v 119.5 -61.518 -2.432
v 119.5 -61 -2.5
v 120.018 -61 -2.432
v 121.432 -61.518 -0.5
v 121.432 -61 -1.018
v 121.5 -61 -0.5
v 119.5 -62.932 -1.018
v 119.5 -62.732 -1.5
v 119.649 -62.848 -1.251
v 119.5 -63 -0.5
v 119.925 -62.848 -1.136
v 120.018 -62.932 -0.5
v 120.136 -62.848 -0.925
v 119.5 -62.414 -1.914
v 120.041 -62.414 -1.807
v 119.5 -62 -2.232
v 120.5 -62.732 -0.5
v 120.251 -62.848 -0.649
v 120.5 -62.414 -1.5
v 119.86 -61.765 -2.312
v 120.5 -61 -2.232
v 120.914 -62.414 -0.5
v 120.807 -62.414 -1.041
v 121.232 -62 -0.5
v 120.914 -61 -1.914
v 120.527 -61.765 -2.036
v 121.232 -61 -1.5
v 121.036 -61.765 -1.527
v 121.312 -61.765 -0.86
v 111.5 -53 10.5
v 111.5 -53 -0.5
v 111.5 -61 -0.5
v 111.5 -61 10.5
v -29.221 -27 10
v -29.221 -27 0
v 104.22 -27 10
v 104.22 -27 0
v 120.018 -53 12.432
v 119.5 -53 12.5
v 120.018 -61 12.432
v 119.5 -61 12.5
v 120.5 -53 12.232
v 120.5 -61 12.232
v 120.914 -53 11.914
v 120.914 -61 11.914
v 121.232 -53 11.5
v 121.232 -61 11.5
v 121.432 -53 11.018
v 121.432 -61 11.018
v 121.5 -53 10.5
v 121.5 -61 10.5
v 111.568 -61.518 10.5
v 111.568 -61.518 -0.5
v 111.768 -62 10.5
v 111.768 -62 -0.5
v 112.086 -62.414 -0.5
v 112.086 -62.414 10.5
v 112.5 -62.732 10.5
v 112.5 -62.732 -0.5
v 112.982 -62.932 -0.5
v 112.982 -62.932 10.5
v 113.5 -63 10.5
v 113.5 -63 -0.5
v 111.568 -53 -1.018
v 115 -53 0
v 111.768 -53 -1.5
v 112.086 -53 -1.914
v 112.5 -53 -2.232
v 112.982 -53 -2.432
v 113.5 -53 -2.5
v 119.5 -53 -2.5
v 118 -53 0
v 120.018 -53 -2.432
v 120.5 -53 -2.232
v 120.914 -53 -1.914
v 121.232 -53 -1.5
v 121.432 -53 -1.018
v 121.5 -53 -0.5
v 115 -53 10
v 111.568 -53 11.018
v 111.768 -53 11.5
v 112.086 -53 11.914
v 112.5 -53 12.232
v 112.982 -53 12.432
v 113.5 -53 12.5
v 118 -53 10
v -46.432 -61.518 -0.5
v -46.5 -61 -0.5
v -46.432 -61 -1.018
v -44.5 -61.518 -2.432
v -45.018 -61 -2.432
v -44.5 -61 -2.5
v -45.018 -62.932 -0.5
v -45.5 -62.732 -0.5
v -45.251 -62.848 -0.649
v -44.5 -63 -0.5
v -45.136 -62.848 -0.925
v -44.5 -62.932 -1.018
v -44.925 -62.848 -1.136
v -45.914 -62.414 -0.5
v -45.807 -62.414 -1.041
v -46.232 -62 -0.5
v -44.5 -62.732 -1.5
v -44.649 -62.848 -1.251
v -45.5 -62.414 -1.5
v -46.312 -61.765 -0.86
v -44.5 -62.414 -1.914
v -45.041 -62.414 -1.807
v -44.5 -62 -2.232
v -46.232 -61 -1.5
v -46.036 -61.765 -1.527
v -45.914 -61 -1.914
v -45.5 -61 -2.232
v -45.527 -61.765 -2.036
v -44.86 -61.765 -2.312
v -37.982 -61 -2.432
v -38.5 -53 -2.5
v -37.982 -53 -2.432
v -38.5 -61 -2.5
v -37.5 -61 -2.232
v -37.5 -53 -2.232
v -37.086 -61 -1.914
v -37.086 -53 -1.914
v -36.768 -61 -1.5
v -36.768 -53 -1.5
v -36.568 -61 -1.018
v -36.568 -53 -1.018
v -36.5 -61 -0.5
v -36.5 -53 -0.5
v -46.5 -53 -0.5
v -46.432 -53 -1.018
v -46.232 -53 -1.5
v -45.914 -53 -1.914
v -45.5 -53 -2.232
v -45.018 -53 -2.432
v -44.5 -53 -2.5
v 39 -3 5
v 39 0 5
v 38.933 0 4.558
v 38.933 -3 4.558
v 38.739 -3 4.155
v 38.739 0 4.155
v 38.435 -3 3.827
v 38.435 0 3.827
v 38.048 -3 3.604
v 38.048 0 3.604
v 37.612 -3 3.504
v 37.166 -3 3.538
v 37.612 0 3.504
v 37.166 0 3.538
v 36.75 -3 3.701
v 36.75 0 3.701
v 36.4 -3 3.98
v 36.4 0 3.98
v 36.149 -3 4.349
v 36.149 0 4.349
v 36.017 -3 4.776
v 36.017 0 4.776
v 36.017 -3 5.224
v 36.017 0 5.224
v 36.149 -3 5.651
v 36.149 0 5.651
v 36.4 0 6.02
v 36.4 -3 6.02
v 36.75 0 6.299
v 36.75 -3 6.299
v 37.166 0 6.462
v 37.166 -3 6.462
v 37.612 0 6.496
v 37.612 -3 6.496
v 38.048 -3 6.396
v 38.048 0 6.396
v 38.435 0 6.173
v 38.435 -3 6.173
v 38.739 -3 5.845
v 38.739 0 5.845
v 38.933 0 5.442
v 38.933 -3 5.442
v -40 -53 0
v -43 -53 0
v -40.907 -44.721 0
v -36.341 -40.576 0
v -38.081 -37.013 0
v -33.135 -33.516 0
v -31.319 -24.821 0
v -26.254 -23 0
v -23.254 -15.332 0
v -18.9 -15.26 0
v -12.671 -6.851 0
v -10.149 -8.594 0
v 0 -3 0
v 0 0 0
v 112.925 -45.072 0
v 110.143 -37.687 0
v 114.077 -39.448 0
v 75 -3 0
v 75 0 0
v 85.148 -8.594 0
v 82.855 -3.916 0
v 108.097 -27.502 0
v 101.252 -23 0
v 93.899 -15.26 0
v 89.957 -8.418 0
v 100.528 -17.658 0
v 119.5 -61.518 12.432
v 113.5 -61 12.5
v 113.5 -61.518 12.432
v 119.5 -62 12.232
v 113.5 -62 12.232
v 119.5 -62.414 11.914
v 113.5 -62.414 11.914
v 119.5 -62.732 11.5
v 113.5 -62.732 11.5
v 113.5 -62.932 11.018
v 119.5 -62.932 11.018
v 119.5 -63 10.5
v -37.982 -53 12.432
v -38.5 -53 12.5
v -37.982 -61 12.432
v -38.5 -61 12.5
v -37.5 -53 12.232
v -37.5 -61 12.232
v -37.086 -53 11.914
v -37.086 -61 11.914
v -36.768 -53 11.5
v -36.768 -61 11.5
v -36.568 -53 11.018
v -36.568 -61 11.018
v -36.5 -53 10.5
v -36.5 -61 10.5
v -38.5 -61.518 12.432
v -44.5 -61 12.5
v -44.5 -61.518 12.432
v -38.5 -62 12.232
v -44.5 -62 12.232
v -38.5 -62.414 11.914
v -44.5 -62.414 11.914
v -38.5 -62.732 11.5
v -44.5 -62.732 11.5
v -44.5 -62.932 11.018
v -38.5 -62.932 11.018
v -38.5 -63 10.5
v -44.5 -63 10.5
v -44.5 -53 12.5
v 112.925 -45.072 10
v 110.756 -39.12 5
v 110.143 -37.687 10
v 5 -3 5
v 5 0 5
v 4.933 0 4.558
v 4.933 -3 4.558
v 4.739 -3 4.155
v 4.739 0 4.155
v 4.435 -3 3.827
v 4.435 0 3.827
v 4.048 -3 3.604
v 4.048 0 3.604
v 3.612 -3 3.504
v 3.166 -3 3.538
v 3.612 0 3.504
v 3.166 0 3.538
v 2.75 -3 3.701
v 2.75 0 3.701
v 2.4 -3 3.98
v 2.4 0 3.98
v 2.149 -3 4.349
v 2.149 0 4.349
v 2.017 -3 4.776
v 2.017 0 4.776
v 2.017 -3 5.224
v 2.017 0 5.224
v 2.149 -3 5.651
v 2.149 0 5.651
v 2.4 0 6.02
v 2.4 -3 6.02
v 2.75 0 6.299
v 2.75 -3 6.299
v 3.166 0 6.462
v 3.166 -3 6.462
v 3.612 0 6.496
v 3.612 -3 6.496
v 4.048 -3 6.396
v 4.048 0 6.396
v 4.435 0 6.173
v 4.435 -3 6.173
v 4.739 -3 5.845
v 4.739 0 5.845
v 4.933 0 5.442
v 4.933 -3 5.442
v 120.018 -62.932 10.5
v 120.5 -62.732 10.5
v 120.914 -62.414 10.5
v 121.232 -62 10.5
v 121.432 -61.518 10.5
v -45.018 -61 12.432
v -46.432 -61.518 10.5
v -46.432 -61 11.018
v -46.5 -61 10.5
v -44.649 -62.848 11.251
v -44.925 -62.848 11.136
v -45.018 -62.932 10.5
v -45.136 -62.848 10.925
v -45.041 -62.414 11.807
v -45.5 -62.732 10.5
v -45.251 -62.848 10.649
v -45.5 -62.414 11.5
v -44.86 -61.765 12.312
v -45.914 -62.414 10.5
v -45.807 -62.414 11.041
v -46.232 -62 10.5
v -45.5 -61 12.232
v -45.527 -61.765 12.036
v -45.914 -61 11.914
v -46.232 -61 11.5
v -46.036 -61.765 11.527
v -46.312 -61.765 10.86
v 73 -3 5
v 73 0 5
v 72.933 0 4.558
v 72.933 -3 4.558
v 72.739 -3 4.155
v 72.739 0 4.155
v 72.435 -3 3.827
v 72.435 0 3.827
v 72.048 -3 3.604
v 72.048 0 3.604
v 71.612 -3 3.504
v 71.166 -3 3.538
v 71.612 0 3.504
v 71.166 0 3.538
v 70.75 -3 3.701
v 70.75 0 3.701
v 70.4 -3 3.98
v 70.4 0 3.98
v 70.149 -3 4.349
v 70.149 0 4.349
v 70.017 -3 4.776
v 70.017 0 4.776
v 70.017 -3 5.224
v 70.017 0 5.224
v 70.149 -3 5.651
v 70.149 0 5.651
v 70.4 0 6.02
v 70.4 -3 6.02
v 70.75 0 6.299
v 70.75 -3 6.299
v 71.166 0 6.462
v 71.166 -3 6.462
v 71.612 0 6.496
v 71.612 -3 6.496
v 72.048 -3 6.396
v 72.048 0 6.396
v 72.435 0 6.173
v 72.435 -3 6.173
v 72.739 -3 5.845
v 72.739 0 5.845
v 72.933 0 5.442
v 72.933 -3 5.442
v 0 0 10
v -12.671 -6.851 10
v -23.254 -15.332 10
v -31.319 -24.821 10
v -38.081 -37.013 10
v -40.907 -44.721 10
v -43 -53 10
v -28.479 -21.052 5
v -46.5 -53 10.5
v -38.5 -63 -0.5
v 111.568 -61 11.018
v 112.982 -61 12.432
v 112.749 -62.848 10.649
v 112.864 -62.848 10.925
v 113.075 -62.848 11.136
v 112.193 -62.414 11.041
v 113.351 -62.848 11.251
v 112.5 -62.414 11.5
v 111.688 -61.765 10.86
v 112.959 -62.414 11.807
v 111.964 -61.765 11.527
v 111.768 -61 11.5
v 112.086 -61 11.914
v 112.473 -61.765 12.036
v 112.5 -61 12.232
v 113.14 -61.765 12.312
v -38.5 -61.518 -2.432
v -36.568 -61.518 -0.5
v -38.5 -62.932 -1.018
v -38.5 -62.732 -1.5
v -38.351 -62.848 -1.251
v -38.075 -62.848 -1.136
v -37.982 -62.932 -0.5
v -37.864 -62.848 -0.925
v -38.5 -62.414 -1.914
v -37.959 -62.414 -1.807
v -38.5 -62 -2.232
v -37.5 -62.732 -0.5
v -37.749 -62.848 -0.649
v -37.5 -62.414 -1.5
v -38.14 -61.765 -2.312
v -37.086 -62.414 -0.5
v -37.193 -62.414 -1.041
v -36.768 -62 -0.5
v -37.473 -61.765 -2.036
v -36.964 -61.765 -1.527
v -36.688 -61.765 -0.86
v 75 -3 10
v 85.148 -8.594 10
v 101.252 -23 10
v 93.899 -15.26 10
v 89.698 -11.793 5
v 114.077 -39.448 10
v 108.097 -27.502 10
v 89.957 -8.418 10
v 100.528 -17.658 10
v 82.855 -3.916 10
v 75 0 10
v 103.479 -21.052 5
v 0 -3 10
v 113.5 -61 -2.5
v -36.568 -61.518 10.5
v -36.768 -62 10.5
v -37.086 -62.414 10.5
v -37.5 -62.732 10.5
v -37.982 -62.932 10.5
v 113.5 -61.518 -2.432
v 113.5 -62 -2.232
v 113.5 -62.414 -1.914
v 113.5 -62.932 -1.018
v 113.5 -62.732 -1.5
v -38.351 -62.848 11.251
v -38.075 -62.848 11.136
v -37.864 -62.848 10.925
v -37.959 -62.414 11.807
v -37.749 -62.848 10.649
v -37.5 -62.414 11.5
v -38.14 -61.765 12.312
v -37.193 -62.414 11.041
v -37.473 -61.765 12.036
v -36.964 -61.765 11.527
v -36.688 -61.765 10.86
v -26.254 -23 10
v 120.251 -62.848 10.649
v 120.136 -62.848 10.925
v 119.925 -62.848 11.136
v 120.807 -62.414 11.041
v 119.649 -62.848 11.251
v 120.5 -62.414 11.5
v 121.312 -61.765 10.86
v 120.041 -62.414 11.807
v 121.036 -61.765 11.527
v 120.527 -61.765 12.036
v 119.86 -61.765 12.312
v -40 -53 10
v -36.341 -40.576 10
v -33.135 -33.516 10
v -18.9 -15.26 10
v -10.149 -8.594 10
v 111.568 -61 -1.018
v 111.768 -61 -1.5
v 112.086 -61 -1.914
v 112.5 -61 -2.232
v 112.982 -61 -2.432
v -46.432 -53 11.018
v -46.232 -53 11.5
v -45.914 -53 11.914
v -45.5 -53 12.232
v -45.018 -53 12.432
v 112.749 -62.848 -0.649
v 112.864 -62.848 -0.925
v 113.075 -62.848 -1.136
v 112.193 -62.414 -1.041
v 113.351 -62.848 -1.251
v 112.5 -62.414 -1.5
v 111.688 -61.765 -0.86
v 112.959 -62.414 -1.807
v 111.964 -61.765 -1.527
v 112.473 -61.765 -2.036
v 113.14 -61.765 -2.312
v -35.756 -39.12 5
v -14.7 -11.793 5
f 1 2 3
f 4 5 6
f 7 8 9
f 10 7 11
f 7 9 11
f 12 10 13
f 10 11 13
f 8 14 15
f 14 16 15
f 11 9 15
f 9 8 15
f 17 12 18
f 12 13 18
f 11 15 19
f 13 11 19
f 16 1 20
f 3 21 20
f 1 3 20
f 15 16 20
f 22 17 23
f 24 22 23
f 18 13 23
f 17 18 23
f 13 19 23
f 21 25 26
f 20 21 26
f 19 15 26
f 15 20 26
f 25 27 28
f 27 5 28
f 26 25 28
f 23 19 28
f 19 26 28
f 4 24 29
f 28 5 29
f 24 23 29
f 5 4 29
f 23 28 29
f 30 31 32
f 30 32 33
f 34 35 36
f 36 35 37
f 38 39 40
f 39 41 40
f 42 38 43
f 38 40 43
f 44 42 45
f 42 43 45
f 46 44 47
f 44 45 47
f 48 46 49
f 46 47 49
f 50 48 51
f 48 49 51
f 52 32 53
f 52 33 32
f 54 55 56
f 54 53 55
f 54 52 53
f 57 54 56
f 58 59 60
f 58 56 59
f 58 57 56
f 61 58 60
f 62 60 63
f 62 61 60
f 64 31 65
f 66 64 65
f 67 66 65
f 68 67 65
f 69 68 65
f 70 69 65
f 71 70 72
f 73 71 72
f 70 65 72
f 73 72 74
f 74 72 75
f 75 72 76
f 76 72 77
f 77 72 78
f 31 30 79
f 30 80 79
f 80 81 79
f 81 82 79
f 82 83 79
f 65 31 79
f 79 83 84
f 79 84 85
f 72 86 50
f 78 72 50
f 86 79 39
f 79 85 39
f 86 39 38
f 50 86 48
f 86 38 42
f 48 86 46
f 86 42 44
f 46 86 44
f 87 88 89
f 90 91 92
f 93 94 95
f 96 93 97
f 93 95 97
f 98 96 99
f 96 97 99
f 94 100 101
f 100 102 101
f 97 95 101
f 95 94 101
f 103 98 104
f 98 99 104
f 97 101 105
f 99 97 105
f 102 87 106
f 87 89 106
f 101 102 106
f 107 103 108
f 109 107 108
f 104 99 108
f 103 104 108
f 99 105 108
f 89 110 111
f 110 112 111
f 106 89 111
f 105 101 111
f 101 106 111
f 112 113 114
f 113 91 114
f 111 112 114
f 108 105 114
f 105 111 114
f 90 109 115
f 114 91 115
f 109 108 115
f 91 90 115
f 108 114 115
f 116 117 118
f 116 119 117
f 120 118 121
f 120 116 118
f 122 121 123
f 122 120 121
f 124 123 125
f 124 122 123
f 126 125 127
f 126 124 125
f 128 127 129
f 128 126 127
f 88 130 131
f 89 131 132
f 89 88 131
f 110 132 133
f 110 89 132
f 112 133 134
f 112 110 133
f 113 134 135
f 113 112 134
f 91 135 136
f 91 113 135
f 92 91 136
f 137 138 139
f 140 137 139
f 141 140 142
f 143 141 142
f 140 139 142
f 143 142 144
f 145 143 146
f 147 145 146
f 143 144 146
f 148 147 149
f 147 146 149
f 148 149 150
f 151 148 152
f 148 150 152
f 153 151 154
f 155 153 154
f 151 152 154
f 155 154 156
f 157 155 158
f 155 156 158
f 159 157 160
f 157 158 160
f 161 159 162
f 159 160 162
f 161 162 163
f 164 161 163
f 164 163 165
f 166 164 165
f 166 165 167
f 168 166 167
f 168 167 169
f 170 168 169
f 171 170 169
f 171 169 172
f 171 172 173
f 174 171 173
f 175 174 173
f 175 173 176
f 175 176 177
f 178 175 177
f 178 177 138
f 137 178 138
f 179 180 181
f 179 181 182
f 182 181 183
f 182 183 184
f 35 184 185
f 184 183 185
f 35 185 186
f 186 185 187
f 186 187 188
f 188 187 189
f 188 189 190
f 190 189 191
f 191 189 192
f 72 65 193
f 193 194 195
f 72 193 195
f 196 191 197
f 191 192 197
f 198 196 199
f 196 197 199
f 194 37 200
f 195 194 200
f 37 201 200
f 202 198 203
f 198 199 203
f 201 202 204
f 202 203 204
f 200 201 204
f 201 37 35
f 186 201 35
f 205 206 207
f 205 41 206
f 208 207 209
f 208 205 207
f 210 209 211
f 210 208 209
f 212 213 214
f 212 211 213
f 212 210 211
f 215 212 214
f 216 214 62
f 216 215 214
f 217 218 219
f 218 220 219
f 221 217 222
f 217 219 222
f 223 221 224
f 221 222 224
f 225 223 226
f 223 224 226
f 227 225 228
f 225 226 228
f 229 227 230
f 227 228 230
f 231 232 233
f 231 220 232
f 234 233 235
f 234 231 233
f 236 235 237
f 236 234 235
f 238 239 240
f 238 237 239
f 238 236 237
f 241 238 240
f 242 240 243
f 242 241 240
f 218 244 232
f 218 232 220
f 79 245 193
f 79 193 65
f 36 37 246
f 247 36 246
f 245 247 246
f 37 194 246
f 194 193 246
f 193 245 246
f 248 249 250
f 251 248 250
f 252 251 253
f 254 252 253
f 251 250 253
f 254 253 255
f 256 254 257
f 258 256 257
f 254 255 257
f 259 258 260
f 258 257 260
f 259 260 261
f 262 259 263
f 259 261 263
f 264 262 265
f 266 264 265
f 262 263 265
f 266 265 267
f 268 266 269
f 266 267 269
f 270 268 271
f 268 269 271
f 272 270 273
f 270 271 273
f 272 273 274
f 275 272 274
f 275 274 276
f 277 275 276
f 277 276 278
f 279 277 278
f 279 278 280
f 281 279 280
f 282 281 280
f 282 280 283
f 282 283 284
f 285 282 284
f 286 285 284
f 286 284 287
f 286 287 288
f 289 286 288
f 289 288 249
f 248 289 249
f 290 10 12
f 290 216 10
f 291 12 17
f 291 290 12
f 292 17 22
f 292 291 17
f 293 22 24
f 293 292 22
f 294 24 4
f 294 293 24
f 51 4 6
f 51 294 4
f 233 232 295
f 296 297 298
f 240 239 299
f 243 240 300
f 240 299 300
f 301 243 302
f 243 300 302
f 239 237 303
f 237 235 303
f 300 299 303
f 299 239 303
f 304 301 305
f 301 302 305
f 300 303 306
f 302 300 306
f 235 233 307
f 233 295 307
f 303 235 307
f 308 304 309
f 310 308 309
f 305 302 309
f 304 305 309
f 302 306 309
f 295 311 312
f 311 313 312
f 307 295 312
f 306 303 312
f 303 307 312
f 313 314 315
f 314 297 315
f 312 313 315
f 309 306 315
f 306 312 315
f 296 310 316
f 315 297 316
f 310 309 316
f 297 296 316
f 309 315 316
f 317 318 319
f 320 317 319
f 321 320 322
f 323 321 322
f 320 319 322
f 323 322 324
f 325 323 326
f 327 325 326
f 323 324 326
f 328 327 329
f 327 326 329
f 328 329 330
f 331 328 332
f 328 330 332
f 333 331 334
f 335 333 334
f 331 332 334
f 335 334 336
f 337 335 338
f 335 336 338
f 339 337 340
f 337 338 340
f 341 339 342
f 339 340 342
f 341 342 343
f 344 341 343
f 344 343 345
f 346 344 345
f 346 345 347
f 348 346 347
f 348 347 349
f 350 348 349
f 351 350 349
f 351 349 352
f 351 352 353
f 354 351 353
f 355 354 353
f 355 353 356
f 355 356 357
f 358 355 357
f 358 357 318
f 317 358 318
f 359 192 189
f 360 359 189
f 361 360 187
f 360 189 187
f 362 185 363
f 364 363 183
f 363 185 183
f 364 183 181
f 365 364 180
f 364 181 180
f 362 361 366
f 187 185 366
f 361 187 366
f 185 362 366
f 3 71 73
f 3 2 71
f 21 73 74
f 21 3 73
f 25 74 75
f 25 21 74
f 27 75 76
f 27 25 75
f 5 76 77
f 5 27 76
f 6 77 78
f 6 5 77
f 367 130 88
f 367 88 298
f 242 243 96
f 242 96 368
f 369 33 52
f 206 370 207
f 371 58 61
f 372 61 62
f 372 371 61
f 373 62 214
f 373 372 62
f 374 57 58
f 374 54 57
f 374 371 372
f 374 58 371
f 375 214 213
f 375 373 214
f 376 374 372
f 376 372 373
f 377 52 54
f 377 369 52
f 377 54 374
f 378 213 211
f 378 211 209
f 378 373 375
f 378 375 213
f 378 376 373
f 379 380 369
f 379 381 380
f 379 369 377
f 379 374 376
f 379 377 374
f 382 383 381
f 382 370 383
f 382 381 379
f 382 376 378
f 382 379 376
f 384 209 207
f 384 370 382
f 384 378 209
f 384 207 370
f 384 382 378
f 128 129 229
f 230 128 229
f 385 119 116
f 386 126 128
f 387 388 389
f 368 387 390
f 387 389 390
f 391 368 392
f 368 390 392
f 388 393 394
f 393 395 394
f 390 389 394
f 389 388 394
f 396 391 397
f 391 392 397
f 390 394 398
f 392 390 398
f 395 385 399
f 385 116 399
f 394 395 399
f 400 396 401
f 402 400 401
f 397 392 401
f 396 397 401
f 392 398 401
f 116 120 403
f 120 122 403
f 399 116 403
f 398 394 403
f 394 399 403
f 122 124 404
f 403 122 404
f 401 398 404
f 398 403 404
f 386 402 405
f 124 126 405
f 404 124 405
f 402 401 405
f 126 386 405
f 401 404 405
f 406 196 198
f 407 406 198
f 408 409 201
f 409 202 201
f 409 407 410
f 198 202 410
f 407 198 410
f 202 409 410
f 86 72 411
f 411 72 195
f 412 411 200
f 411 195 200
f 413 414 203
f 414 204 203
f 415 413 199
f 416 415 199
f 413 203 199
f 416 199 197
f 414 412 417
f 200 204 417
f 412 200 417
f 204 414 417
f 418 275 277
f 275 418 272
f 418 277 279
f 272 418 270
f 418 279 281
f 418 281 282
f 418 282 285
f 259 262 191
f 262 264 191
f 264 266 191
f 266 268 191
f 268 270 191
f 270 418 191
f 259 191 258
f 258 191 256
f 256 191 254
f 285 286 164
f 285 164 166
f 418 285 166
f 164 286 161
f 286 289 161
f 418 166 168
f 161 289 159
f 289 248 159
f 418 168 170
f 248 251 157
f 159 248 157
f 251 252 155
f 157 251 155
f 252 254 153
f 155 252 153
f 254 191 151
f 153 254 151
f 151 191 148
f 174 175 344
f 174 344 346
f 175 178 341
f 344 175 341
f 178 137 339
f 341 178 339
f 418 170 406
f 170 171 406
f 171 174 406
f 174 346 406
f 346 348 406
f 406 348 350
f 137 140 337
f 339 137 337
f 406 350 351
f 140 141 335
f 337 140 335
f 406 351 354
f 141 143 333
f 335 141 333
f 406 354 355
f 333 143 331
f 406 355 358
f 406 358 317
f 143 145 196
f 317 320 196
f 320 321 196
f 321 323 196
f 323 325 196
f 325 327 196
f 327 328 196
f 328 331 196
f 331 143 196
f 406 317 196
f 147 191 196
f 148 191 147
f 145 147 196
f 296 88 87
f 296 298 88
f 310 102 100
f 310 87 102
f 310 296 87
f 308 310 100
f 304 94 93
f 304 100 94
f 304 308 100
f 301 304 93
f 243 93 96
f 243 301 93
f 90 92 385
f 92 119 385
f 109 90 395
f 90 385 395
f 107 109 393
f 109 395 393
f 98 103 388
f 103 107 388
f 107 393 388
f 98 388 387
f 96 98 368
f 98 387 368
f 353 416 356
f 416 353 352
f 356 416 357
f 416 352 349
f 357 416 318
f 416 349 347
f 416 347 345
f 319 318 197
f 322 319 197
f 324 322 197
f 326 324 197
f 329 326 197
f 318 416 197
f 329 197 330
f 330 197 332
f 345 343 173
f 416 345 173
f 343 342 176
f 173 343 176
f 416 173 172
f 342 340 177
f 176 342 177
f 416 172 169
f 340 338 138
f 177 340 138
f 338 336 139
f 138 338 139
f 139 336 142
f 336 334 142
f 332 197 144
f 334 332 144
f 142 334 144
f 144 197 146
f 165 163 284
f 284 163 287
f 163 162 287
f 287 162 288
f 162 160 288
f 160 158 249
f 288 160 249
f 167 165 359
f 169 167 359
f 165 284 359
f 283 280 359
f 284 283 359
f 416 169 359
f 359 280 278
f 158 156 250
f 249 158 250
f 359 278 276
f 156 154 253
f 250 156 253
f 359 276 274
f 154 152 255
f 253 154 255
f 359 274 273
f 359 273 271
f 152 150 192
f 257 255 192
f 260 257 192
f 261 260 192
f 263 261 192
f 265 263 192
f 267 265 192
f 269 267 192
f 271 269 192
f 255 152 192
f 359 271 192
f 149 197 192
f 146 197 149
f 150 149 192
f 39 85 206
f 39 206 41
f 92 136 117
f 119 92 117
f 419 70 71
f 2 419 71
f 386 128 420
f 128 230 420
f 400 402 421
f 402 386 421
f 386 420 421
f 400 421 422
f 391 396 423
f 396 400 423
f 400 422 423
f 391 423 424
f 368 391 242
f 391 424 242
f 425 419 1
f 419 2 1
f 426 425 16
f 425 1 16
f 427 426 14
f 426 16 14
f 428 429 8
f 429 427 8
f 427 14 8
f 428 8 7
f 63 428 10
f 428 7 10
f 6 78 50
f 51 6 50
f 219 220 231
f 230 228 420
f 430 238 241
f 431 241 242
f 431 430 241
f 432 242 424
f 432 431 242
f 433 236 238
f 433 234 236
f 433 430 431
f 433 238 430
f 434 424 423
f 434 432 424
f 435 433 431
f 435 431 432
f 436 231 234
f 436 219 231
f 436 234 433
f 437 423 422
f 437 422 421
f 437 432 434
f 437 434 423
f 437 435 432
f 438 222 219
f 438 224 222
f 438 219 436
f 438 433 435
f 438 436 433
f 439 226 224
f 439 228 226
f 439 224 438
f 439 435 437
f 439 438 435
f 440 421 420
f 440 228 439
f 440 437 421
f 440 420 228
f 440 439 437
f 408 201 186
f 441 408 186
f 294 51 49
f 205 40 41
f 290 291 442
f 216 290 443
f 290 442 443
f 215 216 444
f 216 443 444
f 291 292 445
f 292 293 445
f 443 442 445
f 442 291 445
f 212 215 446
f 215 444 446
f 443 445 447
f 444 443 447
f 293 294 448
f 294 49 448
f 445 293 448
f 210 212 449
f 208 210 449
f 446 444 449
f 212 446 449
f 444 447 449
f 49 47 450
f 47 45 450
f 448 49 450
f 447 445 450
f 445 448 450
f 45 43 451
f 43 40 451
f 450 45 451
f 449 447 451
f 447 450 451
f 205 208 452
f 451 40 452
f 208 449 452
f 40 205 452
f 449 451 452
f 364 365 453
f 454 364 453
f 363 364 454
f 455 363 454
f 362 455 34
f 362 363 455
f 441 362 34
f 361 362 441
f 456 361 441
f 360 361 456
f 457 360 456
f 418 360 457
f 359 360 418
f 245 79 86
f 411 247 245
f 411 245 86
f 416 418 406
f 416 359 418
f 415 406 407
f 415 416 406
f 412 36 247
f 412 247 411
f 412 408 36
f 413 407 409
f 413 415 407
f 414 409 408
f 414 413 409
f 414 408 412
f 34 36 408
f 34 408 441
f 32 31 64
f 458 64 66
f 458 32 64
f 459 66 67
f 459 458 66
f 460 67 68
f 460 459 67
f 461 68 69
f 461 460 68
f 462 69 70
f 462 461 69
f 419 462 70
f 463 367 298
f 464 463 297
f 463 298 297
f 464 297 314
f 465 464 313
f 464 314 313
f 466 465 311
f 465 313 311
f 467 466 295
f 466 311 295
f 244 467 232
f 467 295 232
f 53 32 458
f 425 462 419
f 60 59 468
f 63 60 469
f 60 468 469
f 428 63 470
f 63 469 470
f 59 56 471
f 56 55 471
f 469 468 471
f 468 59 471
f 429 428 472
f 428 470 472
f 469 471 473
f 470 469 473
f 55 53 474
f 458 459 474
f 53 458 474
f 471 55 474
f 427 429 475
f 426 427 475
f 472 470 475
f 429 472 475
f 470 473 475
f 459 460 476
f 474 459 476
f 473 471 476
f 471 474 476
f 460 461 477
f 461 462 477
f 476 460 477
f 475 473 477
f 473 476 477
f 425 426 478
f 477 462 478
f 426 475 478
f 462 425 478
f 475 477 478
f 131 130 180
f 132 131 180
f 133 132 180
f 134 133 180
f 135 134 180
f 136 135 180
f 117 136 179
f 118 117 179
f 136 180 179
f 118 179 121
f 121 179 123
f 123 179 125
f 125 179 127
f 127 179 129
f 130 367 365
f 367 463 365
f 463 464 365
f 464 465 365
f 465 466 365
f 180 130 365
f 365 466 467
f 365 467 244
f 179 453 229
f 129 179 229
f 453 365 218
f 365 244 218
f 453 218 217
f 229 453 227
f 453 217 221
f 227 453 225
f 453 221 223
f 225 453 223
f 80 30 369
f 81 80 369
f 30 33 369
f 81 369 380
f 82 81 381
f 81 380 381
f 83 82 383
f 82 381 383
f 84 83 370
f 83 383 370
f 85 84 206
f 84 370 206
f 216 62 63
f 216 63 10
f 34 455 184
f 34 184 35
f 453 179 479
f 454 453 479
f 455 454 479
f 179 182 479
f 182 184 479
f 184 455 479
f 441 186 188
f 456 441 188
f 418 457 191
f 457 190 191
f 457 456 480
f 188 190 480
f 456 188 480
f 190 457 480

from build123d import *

# Parameters (mm, degrees)
BOSS_EXTRUDE1_DEPTH = 10
SKETCH2_R           = 1.5
CUT_EXTRUDE1_DEPTH  = 10
SKETCH3_W           = 10
SKETCH3_H           = 15
BOSS_EXTRUDE2_DEPTH = 10
FILLET1_R           = 2
FILLET2_R           = 2


with BuildPart() as part:
    # Sketch1 → Boss-Extrude1 (new body)
    with BuildSketch(Plane.XY):
        with BuildLine():
            Line((75, 0), (0, 0))
            add(Edge.make_bspline(
                [(0, 0), (-35.458503055, -15.603734429), (-43, -53)],
                knots=[0, 0, 0, 1, 1, 1], degree=2))
            Line((-43, -53), (-40, -53))
            add(Edge.make_bspline(
                [(-40, -53), (-36.902106975, -38.240903448), (-29.221449222, -27)],
                knots=[0, 0, 0, 0.424675214, 0.424675214, 0.424675214], degree=2))
            Line((-29.221449222, -27), (104.220036535, -27))
            add(Edge.make_bspline(
                [(104.220036535, -27), (111.901041982, -38.240979318), (115, -53)],
                knots=[1.077789281, 1.077789281, 1.077789281, 1.502471236, 1.502471236, 1.502471236], degree=2))
            Line((115, -53), (118, -53))
            add(Edge.make_bspline(
                [(118, -53), (110.458503055, -15.603734429), (75, 0)],
                knots=[0.536217864, 0.536217864, 0.536217864, 1.536217864, 1.536217864, 1.536217864], degree=2))
        make_face()
        with BuildLine():
            add(Edge.make_bspline(
                [(-26.253921627, -23), (-16.272049525, -10.585512223), (0, -3)],
                knots=[0.502463919, 0.502463919, 0.502463919, 1, 1, 1], degree=2))
            Line((0, -3), (75, -3))
            add(Edge.make_bspline(
                [(75, -3), (91.270620149, -10.585764027), (101.252432073, -23)],
                knots=[0.502471236, 0.502471236, 0.502471236, 1, 1, 1], degree=2))
            Line((101.252432073, -23), (-26.253921627, -23))
        make_face(mode=Mode.SUBTRACT)
    extrude(amount=BOSS_EXTRUDE1_DEPTH)

    # Sketch2 → Cut-Extrude1 (cut)
    with BuildSketch(Plane(origin=(0, 0, 0), x_dir=(1, 0, 0), z_dir=(0, 1, 0))):
        with Locations((71.5, -5)):
            Circle(SKETCH2_R)
        with Locations((3.5, -5)):
            Circle(SKETCH2_R)
        with Locations((37.5, -5)):
            Circle(SKETCH2_R)
    extrude(amount=-CUT_EXTRUDE1_DEPTH, mode=Mode.SUBTRACT)

    # Sketch3 → Boss-Extrude2 (add)
    with BuildSketch(Plane.XZ.offset(53)):
        with Locations((116.5, 5)):
            Rectangle(SKETCH3_W, SKETCH3_H)
        with Locations((-41.5, 5)):
            Rectangle(SKETCH3_W, SKETCH3_H)
    extrude(amount=BOSS_EXTRUDE2_DEPTH)

    # Fillet1
    fillet1_edges = [part.edges().sort_by_distance(p)[0] for p in [
        (111.5, -58, 12.5),
        (111.5, -58, -2.5),
        (121.5, -58, -2.5),
        (121.5, -58, 12.5),
        (111.5, -63, 5),
        (116.5, -63, -2.5),
        (121.5, -63, 5),
        (116.5, -63, 12.5),
    ]]
    fillet(fillet1_edges, radius=FILLET1_R)

    # Fillet2
    fillet2_edges = [part.edges().sort_by_distance(p)[0] for p in [
        (-36.5, -58, 12.5),
        (-46.5, -58, 12.5),
        (-46.5, -58, -2.5),
        (-36.5, -58, -2.5),
        (-41.5, -63, 12.5),
        (-46.5, -63, 5),
        (-41.5, -63, -2.5),
        (-36.5, -63, 5),
    ]]
    fillet(fillet2_edges, radius=FILLET2_R)


solid = part.part
